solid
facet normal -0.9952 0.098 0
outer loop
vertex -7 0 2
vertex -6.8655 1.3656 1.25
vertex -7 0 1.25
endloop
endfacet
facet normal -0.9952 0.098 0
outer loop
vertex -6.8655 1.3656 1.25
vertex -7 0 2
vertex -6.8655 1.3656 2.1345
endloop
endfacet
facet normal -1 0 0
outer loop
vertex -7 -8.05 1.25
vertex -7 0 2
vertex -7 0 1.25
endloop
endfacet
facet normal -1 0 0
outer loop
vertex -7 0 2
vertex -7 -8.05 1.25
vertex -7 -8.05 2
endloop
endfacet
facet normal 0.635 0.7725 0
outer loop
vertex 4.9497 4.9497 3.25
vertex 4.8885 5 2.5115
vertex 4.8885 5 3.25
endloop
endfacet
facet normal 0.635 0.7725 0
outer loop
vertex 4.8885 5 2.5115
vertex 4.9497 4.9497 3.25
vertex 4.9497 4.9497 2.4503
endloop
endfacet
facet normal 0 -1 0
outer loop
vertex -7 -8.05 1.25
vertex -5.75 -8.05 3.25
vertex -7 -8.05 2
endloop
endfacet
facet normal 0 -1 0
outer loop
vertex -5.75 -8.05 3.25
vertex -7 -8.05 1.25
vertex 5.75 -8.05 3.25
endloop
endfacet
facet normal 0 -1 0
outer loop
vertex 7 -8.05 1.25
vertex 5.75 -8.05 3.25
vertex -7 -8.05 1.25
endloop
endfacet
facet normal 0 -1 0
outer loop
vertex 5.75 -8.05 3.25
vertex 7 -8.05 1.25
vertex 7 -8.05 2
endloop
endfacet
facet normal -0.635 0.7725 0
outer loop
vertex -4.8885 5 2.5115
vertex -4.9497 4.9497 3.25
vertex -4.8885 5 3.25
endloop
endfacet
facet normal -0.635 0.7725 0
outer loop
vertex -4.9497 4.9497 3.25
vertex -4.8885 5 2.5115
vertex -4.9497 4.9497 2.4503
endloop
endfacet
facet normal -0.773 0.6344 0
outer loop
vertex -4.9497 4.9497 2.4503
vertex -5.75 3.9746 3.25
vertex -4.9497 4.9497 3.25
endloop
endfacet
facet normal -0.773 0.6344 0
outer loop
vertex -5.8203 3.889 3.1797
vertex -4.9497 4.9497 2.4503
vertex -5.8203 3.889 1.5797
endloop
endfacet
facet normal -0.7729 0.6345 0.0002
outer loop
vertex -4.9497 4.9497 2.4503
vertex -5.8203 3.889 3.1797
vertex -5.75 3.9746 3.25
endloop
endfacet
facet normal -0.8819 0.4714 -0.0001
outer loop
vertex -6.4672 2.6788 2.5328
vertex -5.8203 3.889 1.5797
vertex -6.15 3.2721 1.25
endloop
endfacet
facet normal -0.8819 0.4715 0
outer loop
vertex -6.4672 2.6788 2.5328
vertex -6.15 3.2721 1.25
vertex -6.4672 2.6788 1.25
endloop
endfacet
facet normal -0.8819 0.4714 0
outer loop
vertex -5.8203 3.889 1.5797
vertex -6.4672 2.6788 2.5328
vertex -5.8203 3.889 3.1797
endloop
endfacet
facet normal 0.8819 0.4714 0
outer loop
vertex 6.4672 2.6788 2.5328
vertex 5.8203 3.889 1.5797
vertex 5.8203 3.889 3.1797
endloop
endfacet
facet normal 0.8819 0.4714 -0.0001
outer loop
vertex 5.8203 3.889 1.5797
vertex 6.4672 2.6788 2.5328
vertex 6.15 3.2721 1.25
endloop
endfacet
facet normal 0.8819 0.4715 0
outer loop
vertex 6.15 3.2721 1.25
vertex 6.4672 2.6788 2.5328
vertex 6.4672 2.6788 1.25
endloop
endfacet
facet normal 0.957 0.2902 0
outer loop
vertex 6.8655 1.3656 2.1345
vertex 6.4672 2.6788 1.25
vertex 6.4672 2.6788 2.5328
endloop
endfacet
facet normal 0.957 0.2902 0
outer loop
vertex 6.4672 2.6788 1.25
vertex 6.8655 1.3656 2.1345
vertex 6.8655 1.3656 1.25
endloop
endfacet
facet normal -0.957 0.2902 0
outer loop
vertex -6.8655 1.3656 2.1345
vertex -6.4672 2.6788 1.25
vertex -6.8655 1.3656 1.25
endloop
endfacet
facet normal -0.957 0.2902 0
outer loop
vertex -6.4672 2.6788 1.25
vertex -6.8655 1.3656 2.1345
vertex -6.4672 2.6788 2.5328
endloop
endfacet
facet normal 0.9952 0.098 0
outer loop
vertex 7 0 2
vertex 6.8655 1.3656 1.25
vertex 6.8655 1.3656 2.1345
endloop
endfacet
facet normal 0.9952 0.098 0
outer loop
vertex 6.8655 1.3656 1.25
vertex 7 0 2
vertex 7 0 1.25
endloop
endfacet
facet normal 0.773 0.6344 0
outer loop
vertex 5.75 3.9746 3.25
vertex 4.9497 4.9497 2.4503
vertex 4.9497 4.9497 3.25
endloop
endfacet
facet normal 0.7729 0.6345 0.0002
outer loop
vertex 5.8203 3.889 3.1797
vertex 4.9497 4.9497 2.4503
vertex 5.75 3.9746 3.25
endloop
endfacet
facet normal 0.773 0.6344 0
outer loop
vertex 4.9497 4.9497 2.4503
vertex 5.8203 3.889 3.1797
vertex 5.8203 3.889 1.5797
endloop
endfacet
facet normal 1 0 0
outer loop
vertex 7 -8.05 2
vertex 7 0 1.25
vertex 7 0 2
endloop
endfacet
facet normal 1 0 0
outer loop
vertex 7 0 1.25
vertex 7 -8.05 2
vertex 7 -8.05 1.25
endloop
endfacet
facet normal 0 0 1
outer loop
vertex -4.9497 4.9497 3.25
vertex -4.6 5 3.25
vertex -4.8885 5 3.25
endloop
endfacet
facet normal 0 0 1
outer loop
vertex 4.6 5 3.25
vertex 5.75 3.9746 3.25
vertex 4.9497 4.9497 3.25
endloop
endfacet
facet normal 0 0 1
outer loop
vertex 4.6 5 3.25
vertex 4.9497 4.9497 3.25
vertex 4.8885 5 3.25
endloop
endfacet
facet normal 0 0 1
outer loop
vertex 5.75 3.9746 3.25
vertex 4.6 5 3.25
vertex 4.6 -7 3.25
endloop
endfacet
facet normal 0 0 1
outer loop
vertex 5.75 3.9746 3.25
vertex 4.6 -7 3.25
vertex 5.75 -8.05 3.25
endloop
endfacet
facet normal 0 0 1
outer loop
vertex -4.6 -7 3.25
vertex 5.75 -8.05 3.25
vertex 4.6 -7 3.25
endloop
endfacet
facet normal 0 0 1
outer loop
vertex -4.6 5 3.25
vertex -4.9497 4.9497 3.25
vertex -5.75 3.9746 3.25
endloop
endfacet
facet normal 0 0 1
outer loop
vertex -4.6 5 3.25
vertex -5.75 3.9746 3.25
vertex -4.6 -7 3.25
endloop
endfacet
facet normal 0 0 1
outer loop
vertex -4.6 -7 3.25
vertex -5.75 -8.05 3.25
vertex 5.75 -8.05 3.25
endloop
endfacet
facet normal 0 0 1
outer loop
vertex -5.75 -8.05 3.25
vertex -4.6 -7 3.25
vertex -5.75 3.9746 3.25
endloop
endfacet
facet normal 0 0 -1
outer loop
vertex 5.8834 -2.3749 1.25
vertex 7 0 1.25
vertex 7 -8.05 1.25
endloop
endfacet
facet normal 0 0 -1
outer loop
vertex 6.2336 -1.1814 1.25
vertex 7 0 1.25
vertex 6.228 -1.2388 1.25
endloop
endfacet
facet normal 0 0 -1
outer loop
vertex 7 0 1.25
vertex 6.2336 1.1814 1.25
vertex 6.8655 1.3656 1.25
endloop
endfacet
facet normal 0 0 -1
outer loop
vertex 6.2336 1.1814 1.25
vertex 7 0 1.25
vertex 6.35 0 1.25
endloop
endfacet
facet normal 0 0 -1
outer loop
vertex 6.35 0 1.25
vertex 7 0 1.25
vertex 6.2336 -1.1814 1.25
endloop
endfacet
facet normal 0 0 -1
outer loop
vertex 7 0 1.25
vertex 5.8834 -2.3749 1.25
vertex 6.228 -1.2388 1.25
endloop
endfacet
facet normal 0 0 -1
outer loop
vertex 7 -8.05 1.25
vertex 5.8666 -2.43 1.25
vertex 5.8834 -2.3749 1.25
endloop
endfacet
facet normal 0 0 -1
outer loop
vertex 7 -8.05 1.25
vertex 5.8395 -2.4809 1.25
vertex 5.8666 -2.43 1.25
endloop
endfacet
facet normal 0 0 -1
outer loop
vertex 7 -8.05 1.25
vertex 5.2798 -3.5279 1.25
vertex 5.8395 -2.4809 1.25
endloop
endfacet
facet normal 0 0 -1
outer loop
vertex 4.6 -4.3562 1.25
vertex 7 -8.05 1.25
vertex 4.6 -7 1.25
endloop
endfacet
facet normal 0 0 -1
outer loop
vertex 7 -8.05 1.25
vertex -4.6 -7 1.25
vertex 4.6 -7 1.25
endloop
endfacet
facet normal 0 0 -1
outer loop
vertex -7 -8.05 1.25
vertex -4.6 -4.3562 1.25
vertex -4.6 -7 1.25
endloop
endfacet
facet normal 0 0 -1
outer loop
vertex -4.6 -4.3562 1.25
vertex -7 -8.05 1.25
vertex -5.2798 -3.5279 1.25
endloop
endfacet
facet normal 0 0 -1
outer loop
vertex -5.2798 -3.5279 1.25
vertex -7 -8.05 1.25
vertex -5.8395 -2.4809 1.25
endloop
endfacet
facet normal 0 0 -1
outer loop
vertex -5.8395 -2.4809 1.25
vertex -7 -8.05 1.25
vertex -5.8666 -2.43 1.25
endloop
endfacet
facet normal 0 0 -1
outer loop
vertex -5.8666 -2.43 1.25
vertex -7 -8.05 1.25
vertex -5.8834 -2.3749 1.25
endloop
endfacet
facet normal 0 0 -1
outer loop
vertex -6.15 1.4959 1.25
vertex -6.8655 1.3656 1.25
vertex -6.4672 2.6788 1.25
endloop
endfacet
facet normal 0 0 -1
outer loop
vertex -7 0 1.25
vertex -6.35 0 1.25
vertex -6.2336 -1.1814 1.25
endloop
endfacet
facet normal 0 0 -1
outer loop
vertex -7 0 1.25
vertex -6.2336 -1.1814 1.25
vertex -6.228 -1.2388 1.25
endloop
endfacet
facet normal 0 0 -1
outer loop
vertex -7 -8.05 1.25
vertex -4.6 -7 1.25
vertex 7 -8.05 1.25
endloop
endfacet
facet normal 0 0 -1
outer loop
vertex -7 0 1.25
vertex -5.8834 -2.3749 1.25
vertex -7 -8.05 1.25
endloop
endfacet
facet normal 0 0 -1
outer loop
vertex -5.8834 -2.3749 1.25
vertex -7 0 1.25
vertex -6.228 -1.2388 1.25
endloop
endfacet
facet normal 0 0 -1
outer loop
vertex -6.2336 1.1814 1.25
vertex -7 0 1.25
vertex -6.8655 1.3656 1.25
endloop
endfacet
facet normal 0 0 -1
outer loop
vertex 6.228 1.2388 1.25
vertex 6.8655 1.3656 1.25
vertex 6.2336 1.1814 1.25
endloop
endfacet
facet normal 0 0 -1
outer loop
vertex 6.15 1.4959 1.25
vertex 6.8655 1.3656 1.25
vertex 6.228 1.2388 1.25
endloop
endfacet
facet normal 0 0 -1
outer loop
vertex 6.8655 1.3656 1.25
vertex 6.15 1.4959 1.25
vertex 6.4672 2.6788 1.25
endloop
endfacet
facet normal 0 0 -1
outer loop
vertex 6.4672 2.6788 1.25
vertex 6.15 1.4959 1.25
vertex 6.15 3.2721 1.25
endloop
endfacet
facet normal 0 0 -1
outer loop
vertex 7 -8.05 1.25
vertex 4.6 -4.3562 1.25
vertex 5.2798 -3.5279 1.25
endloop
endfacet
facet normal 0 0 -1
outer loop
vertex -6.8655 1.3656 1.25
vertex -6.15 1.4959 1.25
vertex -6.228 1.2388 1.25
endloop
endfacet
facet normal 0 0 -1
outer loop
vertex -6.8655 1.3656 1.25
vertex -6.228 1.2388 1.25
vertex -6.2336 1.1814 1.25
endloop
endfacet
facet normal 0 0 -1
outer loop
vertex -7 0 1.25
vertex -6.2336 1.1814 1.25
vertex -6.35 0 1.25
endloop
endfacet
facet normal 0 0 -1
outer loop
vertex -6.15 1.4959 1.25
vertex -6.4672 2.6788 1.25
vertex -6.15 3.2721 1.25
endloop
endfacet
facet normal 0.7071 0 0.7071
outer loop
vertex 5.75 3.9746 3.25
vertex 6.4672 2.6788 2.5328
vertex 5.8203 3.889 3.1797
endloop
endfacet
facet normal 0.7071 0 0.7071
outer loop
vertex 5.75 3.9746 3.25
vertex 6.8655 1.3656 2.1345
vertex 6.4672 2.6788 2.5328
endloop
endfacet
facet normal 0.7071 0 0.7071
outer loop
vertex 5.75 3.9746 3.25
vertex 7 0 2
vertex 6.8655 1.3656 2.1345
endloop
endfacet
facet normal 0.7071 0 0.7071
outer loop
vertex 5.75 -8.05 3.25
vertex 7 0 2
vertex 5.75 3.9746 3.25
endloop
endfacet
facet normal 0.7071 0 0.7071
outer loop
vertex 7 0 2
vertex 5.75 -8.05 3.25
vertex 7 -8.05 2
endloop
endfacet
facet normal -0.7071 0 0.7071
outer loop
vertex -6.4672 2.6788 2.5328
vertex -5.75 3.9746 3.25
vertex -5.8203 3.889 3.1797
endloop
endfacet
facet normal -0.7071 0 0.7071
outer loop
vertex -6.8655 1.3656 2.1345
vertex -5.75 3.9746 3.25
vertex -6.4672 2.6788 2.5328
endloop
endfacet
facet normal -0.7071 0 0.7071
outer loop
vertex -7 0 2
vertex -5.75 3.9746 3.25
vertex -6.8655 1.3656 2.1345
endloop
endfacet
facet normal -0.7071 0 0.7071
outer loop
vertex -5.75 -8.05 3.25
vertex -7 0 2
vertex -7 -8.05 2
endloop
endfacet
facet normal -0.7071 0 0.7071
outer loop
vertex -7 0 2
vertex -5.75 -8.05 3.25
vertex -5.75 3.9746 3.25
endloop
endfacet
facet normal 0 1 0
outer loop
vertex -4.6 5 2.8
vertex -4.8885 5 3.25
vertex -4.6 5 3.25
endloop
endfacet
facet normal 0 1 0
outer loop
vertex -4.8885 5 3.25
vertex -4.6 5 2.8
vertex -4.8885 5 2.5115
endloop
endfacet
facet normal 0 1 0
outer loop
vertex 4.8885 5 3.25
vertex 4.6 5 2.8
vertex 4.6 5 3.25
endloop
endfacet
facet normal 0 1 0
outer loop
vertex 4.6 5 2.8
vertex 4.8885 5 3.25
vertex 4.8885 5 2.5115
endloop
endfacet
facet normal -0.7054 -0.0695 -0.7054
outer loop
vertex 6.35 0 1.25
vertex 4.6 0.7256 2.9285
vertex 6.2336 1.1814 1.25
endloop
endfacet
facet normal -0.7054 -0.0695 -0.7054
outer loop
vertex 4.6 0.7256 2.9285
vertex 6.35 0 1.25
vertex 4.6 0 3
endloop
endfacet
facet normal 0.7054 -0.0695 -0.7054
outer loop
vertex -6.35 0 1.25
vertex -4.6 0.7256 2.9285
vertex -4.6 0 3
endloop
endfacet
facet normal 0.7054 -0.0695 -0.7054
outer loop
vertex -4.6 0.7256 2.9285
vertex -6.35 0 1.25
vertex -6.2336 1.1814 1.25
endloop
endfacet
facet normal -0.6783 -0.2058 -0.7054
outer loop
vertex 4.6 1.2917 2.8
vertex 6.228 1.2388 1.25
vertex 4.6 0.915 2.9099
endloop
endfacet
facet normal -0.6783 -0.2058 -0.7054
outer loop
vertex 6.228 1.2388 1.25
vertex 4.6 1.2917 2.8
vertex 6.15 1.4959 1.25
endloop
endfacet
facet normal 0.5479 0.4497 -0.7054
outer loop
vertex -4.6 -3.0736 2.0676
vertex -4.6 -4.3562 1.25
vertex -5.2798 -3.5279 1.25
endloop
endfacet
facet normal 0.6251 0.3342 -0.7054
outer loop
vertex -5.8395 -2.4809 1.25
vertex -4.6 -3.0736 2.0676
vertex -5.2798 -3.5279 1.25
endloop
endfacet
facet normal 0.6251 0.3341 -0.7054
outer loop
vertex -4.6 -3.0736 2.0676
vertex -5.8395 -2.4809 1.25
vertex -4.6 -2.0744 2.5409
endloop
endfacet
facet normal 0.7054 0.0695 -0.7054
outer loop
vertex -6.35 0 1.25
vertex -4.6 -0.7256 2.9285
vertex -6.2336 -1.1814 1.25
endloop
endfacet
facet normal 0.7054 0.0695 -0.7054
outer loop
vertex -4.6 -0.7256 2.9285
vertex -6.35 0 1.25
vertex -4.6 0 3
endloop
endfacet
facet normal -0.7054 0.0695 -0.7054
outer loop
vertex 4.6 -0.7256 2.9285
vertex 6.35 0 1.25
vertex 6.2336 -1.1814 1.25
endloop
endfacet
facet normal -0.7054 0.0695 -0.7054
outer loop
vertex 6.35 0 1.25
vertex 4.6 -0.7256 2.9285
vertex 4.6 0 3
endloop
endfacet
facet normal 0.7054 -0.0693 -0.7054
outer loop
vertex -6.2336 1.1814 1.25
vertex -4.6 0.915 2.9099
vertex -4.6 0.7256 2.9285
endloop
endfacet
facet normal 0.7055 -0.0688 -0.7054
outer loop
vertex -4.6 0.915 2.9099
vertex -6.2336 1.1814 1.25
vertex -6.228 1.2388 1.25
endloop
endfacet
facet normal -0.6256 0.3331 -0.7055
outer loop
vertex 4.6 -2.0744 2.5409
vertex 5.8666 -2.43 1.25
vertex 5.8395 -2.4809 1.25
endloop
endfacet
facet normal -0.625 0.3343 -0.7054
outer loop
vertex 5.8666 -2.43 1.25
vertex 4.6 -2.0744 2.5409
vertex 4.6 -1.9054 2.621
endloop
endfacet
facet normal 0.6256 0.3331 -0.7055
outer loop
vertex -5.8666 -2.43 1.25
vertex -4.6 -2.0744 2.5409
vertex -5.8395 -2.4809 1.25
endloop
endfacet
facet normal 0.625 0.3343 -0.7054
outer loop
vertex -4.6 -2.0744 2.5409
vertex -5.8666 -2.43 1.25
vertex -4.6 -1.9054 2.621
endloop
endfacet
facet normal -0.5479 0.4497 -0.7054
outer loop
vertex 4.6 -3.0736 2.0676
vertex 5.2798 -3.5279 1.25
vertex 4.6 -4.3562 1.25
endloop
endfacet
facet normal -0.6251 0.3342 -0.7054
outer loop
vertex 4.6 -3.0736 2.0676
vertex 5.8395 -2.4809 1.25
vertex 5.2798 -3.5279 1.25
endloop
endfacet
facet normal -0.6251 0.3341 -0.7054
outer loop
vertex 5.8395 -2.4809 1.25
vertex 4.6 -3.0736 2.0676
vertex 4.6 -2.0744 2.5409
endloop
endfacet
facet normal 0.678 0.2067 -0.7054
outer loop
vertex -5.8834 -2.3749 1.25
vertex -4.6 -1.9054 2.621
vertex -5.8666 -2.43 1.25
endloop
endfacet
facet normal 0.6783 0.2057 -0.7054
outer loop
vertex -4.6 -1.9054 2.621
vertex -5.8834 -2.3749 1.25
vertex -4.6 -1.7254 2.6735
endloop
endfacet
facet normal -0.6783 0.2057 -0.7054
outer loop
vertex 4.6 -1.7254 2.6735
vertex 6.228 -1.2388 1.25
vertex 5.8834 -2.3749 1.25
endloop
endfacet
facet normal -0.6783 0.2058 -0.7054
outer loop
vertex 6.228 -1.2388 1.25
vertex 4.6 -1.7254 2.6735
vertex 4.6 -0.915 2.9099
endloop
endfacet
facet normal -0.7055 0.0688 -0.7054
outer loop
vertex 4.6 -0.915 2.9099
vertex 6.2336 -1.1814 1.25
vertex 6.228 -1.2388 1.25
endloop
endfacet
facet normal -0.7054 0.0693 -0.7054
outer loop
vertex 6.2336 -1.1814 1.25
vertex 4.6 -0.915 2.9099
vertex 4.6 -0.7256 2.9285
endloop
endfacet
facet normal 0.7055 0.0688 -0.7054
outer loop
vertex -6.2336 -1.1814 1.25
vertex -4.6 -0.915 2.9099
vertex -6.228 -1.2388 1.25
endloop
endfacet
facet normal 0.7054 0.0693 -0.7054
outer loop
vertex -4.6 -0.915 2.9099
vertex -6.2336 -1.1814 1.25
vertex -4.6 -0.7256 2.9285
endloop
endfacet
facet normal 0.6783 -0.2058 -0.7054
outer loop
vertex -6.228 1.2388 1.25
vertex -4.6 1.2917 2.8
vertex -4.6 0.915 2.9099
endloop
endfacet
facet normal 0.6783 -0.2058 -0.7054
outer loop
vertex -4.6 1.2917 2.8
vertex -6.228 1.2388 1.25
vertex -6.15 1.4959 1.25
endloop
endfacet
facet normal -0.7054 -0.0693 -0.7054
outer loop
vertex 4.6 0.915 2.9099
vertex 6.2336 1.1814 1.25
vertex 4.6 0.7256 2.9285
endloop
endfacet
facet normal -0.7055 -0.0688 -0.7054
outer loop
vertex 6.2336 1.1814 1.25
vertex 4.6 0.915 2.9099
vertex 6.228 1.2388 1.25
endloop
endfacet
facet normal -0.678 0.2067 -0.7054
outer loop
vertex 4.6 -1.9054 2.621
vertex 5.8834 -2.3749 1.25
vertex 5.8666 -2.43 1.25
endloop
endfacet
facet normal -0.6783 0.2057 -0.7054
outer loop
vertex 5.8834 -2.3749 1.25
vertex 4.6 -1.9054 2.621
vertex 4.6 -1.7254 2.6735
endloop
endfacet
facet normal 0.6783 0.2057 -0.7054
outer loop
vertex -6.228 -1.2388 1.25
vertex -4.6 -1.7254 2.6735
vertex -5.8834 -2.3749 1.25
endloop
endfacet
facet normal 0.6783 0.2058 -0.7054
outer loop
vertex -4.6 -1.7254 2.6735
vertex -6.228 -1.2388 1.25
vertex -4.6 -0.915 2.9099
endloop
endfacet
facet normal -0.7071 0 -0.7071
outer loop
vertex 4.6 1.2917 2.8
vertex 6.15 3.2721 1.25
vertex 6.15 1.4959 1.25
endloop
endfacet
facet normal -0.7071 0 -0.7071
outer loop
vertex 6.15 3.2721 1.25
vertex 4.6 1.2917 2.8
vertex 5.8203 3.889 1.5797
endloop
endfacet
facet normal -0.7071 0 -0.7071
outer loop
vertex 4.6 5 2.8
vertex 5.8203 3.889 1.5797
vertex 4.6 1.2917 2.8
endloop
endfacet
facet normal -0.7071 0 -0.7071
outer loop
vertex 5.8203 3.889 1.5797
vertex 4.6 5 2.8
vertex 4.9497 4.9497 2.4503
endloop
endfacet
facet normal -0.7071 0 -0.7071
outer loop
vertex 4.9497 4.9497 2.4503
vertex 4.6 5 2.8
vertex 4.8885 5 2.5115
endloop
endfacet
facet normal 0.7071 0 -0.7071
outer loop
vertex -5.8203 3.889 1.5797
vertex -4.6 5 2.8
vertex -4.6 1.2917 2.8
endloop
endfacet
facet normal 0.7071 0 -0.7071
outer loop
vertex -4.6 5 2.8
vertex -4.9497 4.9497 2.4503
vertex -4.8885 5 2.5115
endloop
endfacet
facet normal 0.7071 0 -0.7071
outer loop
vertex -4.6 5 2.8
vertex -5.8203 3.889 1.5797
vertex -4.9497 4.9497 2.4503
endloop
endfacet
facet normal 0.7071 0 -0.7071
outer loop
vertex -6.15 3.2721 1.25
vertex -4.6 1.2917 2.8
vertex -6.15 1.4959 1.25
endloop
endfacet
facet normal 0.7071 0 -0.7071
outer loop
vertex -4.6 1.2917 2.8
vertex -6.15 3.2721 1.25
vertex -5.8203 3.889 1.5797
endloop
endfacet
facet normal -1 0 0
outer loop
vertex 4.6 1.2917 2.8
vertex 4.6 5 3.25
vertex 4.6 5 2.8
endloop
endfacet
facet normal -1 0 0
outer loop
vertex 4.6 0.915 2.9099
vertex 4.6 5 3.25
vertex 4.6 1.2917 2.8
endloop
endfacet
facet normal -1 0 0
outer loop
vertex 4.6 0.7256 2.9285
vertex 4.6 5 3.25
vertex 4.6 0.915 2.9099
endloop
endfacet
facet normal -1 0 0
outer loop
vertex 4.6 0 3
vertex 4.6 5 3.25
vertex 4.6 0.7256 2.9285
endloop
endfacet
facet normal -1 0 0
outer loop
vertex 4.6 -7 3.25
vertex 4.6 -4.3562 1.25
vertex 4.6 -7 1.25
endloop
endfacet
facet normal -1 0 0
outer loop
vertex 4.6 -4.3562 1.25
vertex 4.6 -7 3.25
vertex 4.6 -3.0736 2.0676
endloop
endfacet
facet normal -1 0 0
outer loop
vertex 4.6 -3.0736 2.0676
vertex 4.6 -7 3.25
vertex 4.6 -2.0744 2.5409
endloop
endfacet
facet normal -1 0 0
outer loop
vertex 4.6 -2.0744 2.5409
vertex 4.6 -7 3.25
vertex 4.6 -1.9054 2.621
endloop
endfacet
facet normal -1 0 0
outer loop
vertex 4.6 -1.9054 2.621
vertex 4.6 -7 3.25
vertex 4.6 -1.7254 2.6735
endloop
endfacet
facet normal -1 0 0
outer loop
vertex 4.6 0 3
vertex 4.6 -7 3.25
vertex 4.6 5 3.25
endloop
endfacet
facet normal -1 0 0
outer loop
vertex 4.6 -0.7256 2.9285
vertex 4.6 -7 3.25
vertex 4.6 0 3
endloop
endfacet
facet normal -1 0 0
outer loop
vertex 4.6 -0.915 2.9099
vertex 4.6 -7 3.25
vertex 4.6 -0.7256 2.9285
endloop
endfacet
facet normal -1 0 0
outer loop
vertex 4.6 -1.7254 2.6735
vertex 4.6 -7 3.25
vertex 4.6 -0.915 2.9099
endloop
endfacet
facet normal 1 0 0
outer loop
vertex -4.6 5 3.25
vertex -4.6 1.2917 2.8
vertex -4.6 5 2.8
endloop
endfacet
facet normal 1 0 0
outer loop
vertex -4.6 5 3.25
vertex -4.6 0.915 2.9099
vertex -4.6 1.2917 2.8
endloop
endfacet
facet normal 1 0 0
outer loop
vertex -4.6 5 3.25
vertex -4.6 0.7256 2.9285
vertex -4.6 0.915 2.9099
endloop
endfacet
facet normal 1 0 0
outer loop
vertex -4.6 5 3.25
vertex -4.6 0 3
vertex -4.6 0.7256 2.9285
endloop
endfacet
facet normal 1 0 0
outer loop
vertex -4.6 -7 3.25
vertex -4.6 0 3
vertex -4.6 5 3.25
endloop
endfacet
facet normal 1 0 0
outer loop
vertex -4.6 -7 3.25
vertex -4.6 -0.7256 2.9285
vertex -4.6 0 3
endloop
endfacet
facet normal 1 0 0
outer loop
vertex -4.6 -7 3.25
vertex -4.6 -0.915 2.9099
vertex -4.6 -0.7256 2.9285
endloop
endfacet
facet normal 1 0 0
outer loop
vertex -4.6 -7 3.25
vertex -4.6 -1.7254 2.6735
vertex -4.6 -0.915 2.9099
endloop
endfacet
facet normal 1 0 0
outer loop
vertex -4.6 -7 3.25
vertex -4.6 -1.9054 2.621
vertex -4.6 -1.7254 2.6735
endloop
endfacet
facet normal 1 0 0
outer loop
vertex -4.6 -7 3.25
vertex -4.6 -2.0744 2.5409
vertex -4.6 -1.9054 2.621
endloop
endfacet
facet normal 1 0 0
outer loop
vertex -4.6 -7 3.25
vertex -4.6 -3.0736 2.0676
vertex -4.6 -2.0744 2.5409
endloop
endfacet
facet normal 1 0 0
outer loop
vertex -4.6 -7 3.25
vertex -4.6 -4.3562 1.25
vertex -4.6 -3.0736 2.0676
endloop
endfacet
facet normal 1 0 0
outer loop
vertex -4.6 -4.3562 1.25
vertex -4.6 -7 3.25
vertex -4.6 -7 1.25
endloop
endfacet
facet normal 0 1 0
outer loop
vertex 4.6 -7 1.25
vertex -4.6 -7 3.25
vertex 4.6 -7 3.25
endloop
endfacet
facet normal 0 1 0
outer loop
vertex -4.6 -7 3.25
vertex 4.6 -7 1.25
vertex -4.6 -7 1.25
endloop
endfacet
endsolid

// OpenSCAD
use <utilities.scad>;

$fn=32;
d=0.05;

tube_lens_r=5+0.1;
tube_lens_edge_h=2;
tube_lens_centre_h=3.4;
gripper_t=1;


        body_r=8;
        inner_r=body_r-1;
        cutout_h=tube_lens_centre_h+1;
        roof_r = inner_r-cutout_h+tube_lens_edge_h;
        
module body(){
    union(){
        difference(){
            //body
            hull(){
                cylinder(r=body_r,h=body_r);
                translate([-body_r,-body_r,0]) cube([2*body_r,body_r,body_r]);
            }
            
            //cutout for lens and holder
            intersection(){
                translate([0,0,1.25]) union(){
                    hull(){
                        cylinder(r=inner_r,h=cutout_h);
                        translate([-inner_r,-body_r-d,0]) cube([inner_r*2,inner_r,cutout_h]);
                    }
                    translate([-roof_r,-tube_lens_r+0.5,0]) cube([roof_r*2,2*tube_lens_r-2*0.5,cutout_h+0.5]);
                }
                rotate([0,45,0]) cube([1,999,1]*(inner_r+tube_lens_edge_h)*sqrt(2),center=true);
            }
            //indent and hole for lens
            translate([0,0,0.5]) cylinder(r1=tube_lens_r,r2=tube_lens_r+0.5,h=1);
            translate([0,0,-d]) cylinder(r=tube_lens_r-0.5,h=9);
            
            //relief so it can slide in without scratches
            //translate([-tube_lens_r+1,-6,1]) cube([tube_lens_r*2-2,6,0.5]); 
            
        }
        
    }
}

module gripper1(){
    reflect([1,0,0]){
        difference(){
            union(){
                translate([0,-inner_r,0]) cube([lens_r,inner_r+sqrt(pow(inner_r,2) - pow(lens_r,2))-0.5,d]);
                translate([0,-inner_r,0]) cube([lens_r+0.5,inner_r+sqrt(pow(inner_r,2) - pow(lens_r,2))-0.5,d]);
            }
        }
    }
}

module gripper(){
    difference(){
        intersection(){
            translate([0,0,1.25]) union(){
                hull(){
                    cylinder(r=inner_r,h=tube_lens_edge_h);
                    translate([-inner_r,-body_r-d,0]) cube([inner_r*2,inner_r,tube_lens_edge_h]);
                }
            }
            rotate([0,45,0]) cube([1,999,1]*(inner_r+tube_lens_edge_h)*sqrt(2),center=true);
            translate([0,-inner_r+4,0]) cube([999,2*body_r,999],center=true);
        }
        //indent and hole for lens
        translate([0,0,0.5]) cylinder(r1=tube_lens_r+tube_lens_edge_h,r2=tube_lens_edge_h,h=tube_lens_r);
        translate([0,0,0.5]) hull() repeat([0,999,0],2) cylinder(r1=tube_lens_r+tube_lens_edge_h-0.2,r2=tube_lens_edge_h-0.2,h=tube_lens_r);
        cube([tube_lens_r*2-1,inner_r*2,999],center=true);
        
        
        
    }
}

module lens() {
    intersection(){
        dh=tube_lens_centre_h-tube_lens_edge_h;
        rs=(pow(dh,2) + pow(tube_lens_r,2))/(2*dh);
        cylinder(r=tube_lens_r,h=999);
        translate([0,0,tube_lens_centre_h-rs]) sphere(r=rs);
    }
}

gripper();
//body();

%translate([0,0,0.5]) lens();
